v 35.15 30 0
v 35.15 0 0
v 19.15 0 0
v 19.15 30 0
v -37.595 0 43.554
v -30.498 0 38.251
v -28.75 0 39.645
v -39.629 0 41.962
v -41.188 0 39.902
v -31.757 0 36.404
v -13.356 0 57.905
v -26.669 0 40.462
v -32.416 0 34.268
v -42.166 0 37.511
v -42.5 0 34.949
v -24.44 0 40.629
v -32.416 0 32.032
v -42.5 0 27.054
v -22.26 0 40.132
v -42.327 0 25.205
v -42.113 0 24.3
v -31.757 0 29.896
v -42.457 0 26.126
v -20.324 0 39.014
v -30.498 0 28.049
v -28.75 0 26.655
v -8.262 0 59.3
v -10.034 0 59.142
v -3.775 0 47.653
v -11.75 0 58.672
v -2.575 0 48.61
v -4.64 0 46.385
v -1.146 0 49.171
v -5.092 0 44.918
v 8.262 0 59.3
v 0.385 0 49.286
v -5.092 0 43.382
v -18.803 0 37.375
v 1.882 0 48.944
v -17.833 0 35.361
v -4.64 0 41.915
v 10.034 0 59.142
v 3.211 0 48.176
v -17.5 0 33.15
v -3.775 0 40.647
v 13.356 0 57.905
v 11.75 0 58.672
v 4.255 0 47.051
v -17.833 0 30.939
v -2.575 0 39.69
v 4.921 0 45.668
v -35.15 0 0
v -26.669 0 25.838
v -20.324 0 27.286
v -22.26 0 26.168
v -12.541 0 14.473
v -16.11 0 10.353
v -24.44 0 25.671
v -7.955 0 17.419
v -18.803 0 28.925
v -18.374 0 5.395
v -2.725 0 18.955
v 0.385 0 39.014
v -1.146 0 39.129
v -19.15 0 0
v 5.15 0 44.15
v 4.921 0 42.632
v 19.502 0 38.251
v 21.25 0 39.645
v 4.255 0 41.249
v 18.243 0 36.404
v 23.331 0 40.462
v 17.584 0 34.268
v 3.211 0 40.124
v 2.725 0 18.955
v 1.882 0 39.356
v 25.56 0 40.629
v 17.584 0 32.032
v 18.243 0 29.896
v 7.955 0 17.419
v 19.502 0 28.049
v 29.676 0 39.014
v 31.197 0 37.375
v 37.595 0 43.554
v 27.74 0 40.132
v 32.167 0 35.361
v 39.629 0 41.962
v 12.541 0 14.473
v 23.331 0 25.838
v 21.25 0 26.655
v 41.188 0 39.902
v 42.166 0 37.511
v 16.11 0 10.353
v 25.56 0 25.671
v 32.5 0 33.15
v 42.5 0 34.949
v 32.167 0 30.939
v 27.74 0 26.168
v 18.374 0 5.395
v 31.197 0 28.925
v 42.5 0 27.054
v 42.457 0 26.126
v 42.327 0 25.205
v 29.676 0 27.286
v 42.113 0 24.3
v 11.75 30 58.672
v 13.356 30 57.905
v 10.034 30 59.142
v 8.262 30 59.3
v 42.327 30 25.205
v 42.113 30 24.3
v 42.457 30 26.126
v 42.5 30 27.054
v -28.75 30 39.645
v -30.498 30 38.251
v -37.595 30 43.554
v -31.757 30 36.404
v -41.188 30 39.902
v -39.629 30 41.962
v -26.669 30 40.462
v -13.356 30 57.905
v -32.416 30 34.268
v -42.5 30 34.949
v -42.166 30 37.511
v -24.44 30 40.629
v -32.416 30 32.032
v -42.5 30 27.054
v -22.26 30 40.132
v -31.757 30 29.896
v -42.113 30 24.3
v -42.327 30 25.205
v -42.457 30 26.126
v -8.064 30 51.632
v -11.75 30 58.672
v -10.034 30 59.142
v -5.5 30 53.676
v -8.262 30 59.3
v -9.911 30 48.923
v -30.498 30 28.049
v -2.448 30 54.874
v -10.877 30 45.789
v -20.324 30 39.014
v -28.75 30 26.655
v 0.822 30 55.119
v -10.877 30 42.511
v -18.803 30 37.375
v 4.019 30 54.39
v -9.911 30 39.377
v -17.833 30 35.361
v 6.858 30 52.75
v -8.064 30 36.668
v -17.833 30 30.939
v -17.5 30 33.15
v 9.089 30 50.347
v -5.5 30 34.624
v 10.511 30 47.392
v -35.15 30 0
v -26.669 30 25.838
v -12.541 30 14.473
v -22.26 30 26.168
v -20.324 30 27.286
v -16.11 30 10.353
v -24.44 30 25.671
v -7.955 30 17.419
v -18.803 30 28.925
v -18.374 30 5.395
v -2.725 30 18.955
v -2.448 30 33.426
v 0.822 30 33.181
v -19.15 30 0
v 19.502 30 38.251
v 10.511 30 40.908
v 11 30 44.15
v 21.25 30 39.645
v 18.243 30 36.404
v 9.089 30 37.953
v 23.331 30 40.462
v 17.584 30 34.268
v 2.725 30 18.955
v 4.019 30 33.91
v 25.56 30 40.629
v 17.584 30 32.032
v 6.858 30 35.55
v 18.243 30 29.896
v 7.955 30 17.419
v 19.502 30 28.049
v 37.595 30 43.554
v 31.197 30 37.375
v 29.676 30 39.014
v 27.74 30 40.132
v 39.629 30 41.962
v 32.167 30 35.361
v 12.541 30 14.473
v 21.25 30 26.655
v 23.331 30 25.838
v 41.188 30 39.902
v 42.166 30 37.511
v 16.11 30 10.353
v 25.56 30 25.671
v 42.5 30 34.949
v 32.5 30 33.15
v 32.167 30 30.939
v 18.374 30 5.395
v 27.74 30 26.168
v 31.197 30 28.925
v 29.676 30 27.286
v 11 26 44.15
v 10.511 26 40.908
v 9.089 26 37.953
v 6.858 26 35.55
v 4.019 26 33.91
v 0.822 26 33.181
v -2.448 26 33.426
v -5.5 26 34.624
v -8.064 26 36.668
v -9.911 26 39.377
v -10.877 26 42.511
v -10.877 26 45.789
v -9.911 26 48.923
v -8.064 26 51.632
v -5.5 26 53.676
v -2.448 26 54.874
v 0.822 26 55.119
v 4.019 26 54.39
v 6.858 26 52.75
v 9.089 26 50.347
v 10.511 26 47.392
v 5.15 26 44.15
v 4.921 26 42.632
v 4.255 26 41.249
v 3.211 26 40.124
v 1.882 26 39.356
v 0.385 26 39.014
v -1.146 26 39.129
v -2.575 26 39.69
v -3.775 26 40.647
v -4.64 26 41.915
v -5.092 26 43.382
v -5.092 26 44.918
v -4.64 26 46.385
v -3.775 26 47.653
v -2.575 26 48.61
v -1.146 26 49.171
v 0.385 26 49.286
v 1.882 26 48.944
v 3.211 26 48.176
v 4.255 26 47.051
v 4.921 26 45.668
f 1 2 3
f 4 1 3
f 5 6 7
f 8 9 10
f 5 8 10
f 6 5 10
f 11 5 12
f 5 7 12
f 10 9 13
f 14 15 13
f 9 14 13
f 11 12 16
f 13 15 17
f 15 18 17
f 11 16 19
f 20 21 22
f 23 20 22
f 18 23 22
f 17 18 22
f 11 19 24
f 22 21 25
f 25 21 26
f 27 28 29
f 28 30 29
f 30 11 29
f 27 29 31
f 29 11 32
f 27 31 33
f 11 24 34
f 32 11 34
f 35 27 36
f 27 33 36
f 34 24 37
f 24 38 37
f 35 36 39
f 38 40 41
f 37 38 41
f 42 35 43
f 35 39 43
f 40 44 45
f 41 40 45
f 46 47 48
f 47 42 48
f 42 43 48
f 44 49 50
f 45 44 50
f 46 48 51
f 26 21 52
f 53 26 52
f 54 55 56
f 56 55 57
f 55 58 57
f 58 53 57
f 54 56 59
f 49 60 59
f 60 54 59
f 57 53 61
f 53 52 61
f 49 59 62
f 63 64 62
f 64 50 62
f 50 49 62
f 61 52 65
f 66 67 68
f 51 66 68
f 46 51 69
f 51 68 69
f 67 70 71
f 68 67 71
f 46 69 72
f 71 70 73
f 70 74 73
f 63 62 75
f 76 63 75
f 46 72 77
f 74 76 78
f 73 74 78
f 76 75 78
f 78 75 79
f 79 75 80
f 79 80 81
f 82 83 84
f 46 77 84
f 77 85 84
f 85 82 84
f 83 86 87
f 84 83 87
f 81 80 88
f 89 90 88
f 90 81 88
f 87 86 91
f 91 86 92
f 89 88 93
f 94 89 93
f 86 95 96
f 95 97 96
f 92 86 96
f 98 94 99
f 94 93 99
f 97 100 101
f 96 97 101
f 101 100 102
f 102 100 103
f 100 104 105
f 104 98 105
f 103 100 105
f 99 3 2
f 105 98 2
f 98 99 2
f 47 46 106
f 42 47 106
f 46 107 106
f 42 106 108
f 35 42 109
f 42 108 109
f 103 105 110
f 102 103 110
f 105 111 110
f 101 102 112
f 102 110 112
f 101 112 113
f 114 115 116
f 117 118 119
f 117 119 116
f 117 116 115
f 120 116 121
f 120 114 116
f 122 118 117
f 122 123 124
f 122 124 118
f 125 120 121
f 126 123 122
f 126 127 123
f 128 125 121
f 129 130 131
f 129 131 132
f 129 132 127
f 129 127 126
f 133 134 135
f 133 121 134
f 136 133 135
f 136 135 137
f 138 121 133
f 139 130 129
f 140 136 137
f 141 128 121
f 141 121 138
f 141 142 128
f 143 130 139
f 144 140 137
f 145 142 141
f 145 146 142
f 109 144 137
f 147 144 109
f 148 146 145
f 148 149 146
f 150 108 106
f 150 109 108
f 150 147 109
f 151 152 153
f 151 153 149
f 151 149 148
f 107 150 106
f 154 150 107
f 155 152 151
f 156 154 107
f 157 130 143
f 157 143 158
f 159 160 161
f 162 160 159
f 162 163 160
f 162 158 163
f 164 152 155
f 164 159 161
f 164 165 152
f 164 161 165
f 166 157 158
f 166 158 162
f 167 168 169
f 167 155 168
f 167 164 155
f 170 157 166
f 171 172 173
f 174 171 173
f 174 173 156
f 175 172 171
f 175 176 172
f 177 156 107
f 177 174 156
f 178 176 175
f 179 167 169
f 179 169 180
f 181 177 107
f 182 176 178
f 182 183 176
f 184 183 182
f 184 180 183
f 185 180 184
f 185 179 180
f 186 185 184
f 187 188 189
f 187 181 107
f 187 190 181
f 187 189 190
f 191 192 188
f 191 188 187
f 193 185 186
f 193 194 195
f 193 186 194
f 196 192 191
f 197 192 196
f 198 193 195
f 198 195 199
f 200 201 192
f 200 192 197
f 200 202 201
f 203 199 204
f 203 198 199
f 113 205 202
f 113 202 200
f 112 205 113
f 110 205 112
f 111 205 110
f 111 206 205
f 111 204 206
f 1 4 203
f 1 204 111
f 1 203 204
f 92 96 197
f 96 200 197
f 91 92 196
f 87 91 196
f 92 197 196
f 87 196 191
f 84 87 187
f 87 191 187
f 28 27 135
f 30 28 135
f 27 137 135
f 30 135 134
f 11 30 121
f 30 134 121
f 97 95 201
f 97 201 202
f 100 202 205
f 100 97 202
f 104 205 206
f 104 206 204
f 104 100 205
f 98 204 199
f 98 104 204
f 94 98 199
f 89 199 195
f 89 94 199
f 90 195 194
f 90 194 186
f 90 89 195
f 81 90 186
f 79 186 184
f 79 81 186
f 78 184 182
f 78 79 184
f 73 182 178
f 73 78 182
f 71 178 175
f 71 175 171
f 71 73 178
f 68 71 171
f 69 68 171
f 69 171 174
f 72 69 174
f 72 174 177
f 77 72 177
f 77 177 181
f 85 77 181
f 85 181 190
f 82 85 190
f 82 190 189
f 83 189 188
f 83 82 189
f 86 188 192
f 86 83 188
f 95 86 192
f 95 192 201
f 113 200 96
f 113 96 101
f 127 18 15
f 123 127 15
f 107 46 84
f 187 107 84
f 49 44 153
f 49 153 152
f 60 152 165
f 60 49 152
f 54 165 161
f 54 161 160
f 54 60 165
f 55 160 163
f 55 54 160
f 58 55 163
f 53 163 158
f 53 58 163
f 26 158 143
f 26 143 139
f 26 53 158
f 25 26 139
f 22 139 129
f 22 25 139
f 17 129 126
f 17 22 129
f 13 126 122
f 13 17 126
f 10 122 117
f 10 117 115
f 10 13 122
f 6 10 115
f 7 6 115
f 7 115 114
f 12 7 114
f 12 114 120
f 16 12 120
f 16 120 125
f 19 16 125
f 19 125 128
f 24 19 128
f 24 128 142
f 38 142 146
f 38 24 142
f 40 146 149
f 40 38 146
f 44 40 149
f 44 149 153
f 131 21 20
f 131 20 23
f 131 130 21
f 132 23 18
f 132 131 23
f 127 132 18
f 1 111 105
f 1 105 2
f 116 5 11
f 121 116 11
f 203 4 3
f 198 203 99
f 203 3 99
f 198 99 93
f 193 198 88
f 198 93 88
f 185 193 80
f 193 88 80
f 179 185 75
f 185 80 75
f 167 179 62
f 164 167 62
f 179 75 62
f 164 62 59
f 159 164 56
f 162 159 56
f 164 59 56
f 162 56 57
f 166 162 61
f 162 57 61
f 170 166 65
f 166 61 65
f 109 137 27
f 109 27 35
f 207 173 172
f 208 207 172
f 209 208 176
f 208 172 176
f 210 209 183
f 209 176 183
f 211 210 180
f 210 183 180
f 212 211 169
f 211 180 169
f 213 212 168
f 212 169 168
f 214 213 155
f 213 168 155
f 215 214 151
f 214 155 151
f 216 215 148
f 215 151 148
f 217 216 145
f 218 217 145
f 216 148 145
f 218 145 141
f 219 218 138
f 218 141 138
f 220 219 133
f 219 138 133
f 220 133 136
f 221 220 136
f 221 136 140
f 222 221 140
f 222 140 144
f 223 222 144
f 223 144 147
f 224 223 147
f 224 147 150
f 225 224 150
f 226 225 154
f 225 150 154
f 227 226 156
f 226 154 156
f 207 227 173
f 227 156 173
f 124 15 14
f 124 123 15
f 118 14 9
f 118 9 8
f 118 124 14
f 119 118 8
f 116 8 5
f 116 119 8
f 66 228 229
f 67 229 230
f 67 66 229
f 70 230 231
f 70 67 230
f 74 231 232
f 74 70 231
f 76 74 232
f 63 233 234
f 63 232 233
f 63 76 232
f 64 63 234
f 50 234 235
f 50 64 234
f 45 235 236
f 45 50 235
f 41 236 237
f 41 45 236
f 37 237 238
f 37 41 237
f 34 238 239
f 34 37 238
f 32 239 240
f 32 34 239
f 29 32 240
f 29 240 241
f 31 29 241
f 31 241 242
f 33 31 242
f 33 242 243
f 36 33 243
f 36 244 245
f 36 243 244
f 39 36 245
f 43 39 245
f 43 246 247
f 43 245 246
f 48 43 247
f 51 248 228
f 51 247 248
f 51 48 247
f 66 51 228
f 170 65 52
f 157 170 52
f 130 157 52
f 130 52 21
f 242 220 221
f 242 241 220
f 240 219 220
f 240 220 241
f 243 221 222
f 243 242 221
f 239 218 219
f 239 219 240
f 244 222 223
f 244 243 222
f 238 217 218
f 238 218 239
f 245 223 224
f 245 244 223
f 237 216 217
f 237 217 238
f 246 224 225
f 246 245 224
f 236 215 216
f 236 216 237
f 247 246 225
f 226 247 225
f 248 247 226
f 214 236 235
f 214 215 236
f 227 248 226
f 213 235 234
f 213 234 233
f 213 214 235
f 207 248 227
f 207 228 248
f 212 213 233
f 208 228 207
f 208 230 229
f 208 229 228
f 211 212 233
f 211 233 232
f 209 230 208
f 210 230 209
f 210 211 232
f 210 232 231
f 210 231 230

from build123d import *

# Parameters (mm, degrees)
SKETCH2_R           = 7.5
SKETCH2_R_2         = 5.15
BOSS_EXTRUDE1_DEPTH = 30
FILLET1_R           = 10
SKETCH4_R           = 11
CUT_EXTRUDE1_DEPTH  = 4


with BuildPart() as part:
    # Sketch2 → Boss-Extrude1 (new body)
    with BuildSketch(Plane(origin=(0, 0, 0), x_dir=(1, 0, 0), z_dir=(0, 1, 0))):
        with BuildLine():
            Line((35.15, 0), (19.15, 0))
            ThreePointArc((19.15, 0), (0, -19.15), (-19.15, 0))
            Line((-19.15, 0), (-35.15, 0))
            Line((-35.15, 0), (-42.5, -25.65))
            Line((-42.5, -25.65), (-42.5, -40.65))
            Line((-42.5, -40.65), (-11, -59.3))
            Line((-11, -59.3), (11, -59.3))
            Line((11, -59.3), (42.5, -40.65))
            Line((42.5, -40.65), (42.5, -25.65))
            Line((42.5, -25.65), (35.15, 0))
        make_face()
        with Locations((-25, -33.15)):
            Circle(SKETCH2_R, mode=Mode.SUBTRACT)
        with Locations((25, -33.15)):
            Circle(SKETCH2_R, mode=Mode.SUBTRACT)
        with Locations((0, -44.15)):
            Circle(SKETCH2_R_2, mode=Mode.SUBTRACT)
    extrude(amount=BOSS_EXTRUDE1_DEPTH)

    # Fillet1
    fillet1_edges = [part.edges().sort_by_distance(p)[0] for p in [
        (42.5, 15, 25.65),
        (42.5, 15, 40.65),
        (11, 15, 59.3),
        (-11, 15, 59.3),
        (-42.5, 15, 40.65),
        (-42.5, 15, 25.65),
    ]]
    fillet(fillet1_edges, radius=FILLET1_R)

    # Sketch4 → Cut-Extrude1 (cut)
    with BuildSketch(Plane(origin=(0, 30, 0), x_dir=(1, 0, 0), z_dir=(0, 1, 0))):
        with Locations((0, -44.15)):
            Circle(SKETCH4_R)
    extrude(amount=-CUT_EXTRUDE1_DEPTH, mode=Mode.SUBTRACT)


solid = part.part
